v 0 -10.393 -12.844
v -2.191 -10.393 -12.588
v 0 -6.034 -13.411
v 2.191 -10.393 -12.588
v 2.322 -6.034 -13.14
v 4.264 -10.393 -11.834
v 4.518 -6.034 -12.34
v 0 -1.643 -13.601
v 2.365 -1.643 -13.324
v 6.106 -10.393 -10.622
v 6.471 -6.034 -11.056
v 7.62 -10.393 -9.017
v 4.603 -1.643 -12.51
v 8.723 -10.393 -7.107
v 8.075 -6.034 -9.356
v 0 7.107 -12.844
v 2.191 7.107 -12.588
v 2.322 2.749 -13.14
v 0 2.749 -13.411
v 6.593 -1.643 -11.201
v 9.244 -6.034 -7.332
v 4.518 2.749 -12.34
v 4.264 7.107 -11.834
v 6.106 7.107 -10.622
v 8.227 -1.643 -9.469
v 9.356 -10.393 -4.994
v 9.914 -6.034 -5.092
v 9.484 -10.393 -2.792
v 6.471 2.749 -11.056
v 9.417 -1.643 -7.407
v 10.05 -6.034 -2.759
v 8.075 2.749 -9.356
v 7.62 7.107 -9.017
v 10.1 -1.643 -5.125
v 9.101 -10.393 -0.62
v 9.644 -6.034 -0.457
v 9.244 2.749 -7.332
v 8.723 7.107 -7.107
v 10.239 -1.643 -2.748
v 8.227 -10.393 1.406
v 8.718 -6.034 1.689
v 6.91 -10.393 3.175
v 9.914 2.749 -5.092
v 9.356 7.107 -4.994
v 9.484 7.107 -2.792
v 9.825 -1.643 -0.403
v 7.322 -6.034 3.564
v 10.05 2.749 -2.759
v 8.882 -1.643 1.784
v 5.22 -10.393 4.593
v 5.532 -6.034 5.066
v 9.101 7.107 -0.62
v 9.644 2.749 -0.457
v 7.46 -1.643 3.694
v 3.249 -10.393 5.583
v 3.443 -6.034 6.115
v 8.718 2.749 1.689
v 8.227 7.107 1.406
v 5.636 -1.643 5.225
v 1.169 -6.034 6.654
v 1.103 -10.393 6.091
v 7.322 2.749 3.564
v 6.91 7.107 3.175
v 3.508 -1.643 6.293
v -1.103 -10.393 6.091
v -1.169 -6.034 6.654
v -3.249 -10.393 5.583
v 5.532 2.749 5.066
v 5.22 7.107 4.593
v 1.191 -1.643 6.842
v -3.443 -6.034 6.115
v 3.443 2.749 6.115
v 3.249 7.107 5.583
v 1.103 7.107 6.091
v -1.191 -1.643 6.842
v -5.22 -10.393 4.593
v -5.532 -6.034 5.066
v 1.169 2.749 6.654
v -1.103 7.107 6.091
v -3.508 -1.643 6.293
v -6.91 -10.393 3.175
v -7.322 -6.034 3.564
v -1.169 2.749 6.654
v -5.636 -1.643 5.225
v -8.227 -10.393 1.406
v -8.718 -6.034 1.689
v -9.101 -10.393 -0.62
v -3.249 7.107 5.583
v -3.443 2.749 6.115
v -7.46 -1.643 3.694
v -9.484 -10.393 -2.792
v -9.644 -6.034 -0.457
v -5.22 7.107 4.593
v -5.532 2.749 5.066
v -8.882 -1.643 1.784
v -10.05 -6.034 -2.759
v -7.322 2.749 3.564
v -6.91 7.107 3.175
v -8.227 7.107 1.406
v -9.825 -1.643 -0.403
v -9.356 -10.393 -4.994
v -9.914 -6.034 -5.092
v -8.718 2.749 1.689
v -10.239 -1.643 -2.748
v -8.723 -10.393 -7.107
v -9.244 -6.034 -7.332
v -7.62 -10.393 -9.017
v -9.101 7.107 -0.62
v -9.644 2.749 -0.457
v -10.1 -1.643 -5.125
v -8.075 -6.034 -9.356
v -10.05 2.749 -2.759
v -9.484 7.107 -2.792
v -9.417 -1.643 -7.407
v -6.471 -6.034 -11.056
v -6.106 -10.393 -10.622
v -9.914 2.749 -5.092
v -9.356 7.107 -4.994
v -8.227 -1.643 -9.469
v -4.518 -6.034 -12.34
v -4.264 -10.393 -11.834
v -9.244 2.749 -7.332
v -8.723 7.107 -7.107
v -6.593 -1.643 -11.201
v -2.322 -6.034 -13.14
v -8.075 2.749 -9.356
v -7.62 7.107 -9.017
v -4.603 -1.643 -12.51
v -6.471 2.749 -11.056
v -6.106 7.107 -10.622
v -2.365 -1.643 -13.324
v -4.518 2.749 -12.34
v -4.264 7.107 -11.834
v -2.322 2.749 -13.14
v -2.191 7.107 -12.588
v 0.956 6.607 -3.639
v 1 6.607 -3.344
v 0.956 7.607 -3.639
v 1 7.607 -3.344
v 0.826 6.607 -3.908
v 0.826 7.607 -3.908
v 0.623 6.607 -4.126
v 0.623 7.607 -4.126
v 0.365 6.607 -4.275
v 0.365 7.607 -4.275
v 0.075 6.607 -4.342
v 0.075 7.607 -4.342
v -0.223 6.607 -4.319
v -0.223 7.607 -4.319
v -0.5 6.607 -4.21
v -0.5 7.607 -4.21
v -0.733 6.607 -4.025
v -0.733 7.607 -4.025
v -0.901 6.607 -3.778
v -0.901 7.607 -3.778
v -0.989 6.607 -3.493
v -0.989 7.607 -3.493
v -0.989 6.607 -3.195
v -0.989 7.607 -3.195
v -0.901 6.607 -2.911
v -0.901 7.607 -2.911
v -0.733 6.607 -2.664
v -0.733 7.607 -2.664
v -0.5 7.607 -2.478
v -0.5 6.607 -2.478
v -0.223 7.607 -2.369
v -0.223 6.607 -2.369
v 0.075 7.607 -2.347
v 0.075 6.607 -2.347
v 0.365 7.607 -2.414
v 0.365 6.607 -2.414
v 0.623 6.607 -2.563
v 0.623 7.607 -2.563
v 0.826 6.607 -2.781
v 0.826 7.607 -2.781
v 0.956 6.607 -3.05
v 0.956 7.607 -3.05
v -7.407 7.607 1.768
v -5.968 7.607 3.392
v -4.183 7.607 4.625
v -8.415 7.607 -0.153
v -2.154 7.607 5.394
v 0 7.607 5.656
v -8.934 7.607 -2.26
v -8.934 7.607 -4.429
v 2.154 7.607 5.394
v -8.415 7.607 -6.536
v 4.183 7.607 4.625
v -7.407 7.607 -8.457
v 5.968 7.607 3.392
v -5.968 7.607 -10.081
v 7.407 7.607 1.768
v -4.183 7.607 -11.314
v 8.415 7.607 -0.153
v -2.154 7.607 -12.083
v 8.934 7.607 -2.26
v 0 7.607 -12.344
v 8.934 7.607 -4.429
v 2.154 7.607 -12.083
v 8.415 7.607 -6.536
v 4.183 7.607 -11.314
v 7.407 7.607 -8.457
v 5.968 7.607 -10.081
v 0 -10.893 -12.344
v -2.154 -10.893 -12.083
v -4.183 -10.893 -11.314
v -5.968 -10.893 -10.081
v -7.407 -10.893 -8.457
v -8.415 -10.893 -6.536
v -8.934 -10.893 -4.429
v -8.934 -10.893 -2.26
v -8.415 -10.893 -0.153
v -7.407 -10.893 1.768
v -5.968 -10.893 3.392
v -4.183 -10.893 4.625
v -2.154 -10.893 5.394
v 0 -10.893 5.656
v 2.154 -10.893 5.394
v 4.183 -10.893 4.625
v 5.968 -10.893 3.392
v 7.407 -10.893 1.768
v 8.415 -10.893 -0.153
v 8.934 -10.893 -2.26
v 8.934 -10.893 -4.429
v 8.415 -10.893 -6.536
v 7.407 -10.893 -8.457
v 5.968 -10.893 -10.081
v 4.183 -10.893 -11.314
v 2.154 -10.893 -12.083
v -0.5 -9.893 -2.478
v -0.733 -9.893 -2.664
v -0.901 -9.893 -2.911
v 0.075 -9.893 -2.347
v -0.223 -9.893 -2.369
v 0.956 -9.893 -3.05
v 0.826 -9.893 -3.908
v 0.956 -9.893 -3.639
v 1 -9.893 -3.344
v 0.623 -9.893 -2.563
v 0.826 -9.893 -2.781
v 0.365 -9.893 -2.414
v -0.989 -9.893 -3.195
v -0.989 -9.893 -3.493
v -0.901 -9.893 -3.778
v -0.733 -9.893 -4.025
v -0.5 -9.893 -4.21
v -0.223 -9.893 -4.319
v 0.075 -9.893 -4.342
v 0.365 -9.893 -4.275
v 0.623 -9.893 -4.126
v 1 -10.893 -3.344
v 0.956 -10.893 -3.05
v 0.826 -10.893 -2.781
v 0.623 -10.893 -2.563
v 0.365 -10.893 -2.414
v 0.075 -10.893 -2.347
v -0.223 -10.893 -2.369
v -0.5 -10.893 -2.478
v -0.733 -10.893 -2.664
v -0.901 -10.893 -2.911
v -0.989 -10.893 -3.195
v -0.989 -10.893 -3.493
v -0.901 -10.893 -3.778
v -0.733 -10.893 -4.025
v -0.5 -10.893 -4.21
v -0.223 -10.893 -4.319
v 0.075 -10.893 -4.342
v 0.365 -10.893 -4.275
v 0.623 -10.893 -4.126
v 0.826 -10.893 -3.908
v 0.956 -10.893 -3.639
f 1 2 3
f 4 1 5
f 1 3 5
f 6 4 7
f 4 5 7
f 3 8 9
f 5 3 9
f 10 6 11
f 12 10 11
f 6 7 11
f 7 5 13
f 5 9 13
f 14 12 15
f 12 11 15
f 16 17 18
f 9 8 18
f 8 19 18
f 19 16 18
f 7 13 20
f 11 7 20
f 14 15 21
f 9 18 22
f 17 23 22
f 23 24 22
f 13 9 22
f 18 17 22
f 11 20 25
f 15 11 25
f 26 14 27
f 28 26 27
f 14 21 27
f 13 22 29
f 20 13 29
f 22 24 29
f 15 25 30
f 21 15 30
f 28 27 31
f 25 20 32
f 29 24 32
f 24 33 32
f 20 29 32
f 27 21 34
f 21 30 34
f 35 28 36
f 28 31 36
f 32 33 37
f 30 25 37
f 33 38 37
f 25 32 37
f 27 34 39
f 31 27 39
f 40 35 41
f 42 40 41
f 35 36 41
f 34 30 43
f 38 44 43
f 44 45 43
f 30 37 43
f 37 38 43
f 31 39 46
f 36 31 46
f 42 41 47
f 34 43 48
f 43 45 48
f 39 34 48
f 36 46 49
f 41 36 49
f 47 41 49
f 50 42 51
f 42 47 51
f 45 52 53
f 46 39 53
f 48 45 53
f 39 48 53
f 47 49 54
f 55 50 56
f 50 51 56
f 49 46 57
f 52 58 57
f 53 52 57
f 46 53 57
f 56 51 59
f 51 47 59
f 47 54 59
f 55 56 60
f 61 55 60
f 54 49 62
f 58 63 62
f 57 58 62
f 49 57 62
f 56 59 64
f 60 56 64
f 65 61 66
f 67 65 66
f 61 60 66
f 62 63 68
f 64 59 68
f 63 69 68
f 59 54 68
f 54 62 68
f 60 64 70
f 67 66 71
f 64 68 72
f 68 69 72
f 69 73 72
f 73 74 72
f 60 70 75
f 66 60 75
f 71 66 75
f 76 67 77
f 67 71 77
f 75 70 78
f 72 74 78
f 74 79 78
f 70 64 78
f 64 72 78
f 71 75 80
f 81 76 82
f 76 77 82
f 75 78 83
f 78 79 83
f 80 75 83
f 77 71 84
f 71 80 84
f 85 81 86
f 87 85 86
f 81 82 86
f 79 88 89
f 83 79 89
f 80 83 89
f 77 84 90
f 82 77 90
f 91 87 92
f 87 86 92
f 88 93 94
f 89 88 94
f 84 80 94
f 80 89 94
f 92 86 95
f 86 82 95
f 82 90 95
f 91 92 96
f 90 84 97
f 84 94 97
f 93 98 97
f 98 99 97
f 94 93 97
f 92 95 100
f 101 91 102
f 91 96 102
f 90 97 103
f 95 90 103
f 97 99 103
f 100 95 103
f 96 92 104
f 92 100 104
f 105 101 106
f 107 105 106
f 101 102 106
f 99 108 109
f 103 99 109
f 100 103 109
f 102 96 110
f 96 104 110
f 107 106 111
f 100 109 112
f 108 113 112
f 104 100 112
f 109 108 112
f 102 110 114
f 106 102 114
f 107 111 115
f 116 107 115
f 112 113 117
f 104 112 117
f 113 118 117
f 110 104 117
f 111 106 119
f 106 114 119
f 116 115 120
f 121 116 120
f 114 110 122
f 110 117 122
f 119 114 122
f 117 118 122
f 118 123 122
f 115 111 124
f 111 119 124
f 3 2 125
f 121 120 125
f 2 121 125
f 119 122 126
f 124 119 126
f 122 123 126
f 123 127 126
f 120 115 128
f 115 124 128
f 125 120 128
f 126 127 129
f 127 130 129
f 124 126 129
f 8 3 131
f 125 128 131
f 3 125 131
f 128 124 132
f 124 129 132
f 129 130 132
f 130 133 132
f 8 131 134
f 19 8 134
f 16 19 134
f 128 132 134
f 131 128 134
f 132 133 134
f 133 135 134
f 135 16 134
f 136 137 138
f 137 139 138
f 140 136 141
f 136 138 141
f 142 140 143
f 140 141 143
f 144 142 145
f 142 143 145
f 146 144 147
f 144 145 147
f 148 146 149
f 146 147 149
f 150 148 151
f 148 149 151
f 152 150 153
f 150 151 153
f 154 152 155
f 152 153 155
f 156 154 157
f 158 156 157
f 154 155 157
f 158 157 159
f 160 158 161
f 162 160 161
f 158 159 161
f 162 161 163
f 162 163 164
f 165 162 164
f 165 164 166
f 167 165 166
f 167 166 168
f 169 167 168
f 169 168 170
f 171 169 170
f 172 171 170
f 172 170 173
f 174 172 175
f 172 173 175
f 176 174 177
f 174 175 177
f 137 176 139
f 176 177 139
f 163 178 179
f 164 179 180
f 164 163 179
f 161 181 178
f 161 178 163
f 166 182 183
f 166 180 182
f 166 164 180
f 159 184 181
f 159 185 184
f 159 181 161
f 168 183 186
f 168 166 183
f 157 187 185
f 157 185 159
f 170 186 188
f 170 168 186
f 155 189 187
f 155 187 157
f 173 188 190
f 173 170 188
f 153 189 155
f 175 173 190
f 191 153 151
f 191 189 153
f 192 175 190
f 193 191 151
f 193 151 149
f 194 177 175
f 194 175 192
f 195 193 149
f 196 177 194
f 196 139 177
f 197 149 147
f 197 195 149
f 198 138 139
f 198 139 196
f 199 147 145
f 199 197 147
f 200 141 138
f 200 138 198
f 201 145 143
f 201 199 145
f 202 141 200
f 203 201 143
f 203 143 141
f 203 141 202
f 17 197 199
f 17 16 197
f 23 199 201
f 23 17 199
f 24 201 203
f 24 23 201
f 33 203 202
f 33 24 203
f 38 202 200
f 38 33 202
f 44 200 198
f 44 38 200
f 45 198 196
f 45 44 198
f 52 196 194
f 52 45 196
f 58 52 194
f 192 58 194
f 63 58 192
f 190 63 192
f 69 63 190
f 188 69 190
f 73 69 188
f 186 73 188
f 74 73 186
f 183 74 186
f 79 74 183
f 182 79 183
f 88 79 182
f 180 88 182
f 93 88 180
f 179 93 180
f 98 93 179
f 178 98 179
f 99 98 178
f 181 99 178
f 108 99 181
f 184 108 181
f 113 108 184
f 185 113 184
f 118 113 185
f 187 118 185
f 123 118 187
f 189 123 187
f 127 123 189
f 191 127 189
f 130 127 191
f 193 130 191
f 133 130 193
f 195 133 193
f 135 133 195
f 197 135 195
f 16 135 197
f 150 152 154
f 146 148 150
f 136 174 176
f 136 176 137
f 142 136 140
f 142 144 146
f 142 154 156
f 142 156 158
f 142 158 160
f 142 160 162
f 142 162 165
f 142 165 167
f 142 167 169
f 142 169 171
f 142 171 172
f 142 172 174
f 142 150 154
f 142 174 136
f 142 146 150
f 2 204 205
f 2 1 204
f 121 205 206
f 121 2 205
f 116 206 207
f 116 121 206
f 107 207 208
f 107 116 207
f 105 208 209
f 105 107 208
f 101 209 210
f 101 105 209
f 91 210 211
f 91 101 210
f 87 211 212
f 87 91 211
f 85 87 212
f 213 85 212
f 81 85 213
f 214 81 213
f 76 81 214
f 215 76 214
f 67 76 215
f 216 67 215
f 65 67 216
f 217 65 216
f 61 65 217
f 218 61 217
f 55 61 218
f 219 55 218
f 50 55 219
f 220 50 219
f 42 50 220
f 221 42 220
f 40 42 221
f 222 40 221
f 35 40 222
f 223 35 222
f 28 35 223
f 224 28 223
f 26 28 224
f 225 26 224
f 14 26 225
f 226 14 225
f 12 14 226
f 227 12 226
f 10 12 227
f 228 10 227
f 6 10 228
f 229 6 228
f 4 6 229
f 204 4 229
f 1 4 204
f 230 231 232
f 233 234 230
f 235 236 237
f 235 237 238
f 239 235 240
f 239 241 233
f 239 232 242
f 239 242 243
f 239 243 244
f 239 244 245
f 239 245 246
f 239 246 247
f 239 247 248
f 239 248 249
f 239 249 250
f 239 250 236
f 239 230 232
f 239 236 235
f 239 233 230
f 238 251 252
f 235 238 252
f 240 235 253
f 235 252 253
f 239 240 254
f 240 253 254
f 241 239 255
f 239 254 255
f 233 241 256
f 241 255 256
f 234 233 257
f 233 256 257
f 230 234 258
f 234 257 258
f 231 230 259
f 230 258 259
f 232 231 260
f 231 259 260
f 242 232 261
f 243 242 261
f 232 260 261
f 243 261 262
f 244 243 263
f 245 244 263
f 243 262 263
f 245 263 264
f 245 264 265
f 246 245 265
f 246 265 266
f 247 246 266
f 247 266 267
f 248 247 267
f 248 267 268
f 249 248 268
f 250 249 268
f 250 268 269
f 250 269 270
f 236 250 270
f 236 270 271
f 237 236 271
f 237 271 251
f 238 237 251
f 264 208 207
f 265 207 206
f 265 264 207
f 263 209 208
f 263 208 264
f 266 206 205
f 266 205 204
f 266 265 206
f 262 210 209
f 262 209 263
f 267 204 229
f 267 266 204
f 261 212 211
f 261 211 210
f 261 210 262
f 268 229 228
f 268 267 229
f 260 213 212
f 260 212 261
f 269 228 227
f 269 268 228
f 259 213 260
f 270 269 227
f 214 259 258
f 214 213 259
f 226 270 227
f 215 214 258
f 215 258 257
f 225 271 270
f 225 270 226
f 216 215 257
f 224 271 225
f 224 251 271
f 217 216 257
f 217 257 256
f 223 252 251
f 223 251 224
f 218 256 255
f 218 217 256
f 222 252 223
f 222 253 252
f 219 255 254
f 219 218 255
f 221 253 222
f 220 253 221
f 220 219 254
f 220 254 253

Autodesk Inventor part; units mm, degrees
ref_plane "YZ Plane" through (0, 0, 0) normal (1, 0, 0) x (0, 1, 0)
ref_plane "XZ Plane" through (0, 0, 0) normal (0, 1, 0) x (-1, 0, 0)
ref_plane "XY Plane" through (0, 0, 0) normal (0, 0, 1) x (1, 0, 0)
sketch "Sketch1" plane through (0, 0, 0) normal (1, 0, 0) x (0, 1, 0)
  line L0 (7.6074, 5.6556) -> (7.6074, -12.3444)
  line L1 (7.6074, 5.6556) -> (-10.8926, 5.6556)
  line L2 (-10.8926, 5.6556) -> (-10.8926, -12.3444)
  line L3 (-10.8926, -12.3444) -> (7.6074, -12.3444)
  line L4 (7.6074, -3.3444) -> (7.6074, -12.3444)
  line L5 (7.1074, -12.8444) -> (-10.3926, -12.8444)
  line L6 (-10.8926, -12.3444) -> (-10.8926, -12.3444)
  line L7 (7.6074, -12.3444) -> (7.1074, -12.8444)
  line L8 (-10.8926, -12.3444) -> (-10.3926, -12.8444)
  arc A0 (-10.3926, -12.8444) -> (7.1074, -12.8444) centre (-1.6426, 37.3994) ccw
  line L9 (7.6074, -3.3444) -> (-10.8926, -3.3444)
  line L10 (-10.8926, 5.6556) -> (7.6074, 5.6556)
  line L11 (7.1074, 6.1556) -> (-10.3926, 6.1556)
  line L12 (-10.8926, 5.6556) -> (-10.8926, 5.6556)
  line L13 (7.6074, 5.6556) -> (7.1074, 6.1556)
  line L14 (-10.8926, 5.6556) -> (-10.3926, 6.1556)
  arc A1 (7.1074, 6.1556) -> (-10.3926, 6.1556) centre (-1.6426, -44.0882) ccw
  line L15 (-1.6426, -13.6006) -> (-1.6426, -3.3444) construction
  point P0 (0, 0)
  point P1 (7.6074, -12.8444)
  point P2 (-10.8926, -12.8444)
  point P3 (7.6074, 6.1556)
  point P4 (-10.8926, 6.1556)
  point P5 (-1.6426, 6.9118)
  dimension "d0" = 18
  dimension "d1" = 18.5
  dimension "d2" = 9.5
  dimension "d3" = 0.5
  dimension "d4" = 0.5
  dimension "d5" = 0.5
  dimension "d6" = 0.5
  dimension "d7" = 51
  dimension "d8" = 10.2562
  dimension "d9" = 20.5124
revolve "Revolution1" add sketch "Sketch1" angle 360 about axis through (0, 7.6074, -3.3444) along (0, -1, 0) contours L0 L3 L2 L9 | L7 L5 L8 L3 | A0 L5
sketch "Sketch2" plane through (0, 7.6074, -3.3444) normal (0, 1, 0) x (1, 0, 0)
  circle A0 centre (0, 0) radius 1
  circle A1 centre (0, 0) radius 9.5 projected
  circle A2 centre (0, 0) radius 1.1
  point P0 (0, -3.3444)
  dimension "d11" = 2
  dimension "d12" = 2.2
extrude "Extrusion1" cut sketch "Sketch2" against normal blind 1.2 contours A0 | A2
sketch "Sketch3" plane through (0, -10.8926, -3.3444) normal (0, -1, 0) x (1, 0, 0)
  circle A0 centre (0, 0) radius 1.1 projected
  circle A1 centre (0, 0) radius 1.1
  point P0 (0, 3.3444)
extrude "Extrusion2" cut sketch "Sketch3" against normal blind 1.2
sketch "Sketch4" plane through (0, -10.8926, -3.3444) normal (0, -1, 0) x (1, 0, 0)
  circle A0 centre (0, 0) radius 1
  circle A1 centre (0, 0) radius 1.1
  point P0 (0, 3.3444)
  dimension "d17" = 2
extrude "Extrusion3" add sketch "Sketch4" against normal blind 1.2
sketch "Sketch5" plane through (0, 7.6074, -3.3444) normal (0, 1, 0) x (1, 0, 0)
  circle A0 centre (0, 0) radius 1
  circle A1 centre (0, 0) radius 1.1
  point P0 (0, -3.3444)
extrude "Extrusion4" add sketch "Sketch5" against normal blind 1.2
sketch "Sketch6" plane through (0, 6.4074, -3.3444) normal (0, 1, 0) x (1, 0, 0)
  circle A0 centre (0, 0) radius 1
  point P0 (0, -3.3444)
extrude "Extrusion5" add sketch "Sketch6" along normal blind 0.2
sketch "Sketch7" plane through (0, -9.6926, -3.3444) normal (0, -1, 0) x (1, 0, 0)
  circle A0 centre (0, 0) radius 1
  point P0 (0, 3.3444)
extrude "Extrusion6" add sketch "Sketch7" along normal blind 0.2
equation "\"d4\" = d3"
equation "\"d6\" = d5"
